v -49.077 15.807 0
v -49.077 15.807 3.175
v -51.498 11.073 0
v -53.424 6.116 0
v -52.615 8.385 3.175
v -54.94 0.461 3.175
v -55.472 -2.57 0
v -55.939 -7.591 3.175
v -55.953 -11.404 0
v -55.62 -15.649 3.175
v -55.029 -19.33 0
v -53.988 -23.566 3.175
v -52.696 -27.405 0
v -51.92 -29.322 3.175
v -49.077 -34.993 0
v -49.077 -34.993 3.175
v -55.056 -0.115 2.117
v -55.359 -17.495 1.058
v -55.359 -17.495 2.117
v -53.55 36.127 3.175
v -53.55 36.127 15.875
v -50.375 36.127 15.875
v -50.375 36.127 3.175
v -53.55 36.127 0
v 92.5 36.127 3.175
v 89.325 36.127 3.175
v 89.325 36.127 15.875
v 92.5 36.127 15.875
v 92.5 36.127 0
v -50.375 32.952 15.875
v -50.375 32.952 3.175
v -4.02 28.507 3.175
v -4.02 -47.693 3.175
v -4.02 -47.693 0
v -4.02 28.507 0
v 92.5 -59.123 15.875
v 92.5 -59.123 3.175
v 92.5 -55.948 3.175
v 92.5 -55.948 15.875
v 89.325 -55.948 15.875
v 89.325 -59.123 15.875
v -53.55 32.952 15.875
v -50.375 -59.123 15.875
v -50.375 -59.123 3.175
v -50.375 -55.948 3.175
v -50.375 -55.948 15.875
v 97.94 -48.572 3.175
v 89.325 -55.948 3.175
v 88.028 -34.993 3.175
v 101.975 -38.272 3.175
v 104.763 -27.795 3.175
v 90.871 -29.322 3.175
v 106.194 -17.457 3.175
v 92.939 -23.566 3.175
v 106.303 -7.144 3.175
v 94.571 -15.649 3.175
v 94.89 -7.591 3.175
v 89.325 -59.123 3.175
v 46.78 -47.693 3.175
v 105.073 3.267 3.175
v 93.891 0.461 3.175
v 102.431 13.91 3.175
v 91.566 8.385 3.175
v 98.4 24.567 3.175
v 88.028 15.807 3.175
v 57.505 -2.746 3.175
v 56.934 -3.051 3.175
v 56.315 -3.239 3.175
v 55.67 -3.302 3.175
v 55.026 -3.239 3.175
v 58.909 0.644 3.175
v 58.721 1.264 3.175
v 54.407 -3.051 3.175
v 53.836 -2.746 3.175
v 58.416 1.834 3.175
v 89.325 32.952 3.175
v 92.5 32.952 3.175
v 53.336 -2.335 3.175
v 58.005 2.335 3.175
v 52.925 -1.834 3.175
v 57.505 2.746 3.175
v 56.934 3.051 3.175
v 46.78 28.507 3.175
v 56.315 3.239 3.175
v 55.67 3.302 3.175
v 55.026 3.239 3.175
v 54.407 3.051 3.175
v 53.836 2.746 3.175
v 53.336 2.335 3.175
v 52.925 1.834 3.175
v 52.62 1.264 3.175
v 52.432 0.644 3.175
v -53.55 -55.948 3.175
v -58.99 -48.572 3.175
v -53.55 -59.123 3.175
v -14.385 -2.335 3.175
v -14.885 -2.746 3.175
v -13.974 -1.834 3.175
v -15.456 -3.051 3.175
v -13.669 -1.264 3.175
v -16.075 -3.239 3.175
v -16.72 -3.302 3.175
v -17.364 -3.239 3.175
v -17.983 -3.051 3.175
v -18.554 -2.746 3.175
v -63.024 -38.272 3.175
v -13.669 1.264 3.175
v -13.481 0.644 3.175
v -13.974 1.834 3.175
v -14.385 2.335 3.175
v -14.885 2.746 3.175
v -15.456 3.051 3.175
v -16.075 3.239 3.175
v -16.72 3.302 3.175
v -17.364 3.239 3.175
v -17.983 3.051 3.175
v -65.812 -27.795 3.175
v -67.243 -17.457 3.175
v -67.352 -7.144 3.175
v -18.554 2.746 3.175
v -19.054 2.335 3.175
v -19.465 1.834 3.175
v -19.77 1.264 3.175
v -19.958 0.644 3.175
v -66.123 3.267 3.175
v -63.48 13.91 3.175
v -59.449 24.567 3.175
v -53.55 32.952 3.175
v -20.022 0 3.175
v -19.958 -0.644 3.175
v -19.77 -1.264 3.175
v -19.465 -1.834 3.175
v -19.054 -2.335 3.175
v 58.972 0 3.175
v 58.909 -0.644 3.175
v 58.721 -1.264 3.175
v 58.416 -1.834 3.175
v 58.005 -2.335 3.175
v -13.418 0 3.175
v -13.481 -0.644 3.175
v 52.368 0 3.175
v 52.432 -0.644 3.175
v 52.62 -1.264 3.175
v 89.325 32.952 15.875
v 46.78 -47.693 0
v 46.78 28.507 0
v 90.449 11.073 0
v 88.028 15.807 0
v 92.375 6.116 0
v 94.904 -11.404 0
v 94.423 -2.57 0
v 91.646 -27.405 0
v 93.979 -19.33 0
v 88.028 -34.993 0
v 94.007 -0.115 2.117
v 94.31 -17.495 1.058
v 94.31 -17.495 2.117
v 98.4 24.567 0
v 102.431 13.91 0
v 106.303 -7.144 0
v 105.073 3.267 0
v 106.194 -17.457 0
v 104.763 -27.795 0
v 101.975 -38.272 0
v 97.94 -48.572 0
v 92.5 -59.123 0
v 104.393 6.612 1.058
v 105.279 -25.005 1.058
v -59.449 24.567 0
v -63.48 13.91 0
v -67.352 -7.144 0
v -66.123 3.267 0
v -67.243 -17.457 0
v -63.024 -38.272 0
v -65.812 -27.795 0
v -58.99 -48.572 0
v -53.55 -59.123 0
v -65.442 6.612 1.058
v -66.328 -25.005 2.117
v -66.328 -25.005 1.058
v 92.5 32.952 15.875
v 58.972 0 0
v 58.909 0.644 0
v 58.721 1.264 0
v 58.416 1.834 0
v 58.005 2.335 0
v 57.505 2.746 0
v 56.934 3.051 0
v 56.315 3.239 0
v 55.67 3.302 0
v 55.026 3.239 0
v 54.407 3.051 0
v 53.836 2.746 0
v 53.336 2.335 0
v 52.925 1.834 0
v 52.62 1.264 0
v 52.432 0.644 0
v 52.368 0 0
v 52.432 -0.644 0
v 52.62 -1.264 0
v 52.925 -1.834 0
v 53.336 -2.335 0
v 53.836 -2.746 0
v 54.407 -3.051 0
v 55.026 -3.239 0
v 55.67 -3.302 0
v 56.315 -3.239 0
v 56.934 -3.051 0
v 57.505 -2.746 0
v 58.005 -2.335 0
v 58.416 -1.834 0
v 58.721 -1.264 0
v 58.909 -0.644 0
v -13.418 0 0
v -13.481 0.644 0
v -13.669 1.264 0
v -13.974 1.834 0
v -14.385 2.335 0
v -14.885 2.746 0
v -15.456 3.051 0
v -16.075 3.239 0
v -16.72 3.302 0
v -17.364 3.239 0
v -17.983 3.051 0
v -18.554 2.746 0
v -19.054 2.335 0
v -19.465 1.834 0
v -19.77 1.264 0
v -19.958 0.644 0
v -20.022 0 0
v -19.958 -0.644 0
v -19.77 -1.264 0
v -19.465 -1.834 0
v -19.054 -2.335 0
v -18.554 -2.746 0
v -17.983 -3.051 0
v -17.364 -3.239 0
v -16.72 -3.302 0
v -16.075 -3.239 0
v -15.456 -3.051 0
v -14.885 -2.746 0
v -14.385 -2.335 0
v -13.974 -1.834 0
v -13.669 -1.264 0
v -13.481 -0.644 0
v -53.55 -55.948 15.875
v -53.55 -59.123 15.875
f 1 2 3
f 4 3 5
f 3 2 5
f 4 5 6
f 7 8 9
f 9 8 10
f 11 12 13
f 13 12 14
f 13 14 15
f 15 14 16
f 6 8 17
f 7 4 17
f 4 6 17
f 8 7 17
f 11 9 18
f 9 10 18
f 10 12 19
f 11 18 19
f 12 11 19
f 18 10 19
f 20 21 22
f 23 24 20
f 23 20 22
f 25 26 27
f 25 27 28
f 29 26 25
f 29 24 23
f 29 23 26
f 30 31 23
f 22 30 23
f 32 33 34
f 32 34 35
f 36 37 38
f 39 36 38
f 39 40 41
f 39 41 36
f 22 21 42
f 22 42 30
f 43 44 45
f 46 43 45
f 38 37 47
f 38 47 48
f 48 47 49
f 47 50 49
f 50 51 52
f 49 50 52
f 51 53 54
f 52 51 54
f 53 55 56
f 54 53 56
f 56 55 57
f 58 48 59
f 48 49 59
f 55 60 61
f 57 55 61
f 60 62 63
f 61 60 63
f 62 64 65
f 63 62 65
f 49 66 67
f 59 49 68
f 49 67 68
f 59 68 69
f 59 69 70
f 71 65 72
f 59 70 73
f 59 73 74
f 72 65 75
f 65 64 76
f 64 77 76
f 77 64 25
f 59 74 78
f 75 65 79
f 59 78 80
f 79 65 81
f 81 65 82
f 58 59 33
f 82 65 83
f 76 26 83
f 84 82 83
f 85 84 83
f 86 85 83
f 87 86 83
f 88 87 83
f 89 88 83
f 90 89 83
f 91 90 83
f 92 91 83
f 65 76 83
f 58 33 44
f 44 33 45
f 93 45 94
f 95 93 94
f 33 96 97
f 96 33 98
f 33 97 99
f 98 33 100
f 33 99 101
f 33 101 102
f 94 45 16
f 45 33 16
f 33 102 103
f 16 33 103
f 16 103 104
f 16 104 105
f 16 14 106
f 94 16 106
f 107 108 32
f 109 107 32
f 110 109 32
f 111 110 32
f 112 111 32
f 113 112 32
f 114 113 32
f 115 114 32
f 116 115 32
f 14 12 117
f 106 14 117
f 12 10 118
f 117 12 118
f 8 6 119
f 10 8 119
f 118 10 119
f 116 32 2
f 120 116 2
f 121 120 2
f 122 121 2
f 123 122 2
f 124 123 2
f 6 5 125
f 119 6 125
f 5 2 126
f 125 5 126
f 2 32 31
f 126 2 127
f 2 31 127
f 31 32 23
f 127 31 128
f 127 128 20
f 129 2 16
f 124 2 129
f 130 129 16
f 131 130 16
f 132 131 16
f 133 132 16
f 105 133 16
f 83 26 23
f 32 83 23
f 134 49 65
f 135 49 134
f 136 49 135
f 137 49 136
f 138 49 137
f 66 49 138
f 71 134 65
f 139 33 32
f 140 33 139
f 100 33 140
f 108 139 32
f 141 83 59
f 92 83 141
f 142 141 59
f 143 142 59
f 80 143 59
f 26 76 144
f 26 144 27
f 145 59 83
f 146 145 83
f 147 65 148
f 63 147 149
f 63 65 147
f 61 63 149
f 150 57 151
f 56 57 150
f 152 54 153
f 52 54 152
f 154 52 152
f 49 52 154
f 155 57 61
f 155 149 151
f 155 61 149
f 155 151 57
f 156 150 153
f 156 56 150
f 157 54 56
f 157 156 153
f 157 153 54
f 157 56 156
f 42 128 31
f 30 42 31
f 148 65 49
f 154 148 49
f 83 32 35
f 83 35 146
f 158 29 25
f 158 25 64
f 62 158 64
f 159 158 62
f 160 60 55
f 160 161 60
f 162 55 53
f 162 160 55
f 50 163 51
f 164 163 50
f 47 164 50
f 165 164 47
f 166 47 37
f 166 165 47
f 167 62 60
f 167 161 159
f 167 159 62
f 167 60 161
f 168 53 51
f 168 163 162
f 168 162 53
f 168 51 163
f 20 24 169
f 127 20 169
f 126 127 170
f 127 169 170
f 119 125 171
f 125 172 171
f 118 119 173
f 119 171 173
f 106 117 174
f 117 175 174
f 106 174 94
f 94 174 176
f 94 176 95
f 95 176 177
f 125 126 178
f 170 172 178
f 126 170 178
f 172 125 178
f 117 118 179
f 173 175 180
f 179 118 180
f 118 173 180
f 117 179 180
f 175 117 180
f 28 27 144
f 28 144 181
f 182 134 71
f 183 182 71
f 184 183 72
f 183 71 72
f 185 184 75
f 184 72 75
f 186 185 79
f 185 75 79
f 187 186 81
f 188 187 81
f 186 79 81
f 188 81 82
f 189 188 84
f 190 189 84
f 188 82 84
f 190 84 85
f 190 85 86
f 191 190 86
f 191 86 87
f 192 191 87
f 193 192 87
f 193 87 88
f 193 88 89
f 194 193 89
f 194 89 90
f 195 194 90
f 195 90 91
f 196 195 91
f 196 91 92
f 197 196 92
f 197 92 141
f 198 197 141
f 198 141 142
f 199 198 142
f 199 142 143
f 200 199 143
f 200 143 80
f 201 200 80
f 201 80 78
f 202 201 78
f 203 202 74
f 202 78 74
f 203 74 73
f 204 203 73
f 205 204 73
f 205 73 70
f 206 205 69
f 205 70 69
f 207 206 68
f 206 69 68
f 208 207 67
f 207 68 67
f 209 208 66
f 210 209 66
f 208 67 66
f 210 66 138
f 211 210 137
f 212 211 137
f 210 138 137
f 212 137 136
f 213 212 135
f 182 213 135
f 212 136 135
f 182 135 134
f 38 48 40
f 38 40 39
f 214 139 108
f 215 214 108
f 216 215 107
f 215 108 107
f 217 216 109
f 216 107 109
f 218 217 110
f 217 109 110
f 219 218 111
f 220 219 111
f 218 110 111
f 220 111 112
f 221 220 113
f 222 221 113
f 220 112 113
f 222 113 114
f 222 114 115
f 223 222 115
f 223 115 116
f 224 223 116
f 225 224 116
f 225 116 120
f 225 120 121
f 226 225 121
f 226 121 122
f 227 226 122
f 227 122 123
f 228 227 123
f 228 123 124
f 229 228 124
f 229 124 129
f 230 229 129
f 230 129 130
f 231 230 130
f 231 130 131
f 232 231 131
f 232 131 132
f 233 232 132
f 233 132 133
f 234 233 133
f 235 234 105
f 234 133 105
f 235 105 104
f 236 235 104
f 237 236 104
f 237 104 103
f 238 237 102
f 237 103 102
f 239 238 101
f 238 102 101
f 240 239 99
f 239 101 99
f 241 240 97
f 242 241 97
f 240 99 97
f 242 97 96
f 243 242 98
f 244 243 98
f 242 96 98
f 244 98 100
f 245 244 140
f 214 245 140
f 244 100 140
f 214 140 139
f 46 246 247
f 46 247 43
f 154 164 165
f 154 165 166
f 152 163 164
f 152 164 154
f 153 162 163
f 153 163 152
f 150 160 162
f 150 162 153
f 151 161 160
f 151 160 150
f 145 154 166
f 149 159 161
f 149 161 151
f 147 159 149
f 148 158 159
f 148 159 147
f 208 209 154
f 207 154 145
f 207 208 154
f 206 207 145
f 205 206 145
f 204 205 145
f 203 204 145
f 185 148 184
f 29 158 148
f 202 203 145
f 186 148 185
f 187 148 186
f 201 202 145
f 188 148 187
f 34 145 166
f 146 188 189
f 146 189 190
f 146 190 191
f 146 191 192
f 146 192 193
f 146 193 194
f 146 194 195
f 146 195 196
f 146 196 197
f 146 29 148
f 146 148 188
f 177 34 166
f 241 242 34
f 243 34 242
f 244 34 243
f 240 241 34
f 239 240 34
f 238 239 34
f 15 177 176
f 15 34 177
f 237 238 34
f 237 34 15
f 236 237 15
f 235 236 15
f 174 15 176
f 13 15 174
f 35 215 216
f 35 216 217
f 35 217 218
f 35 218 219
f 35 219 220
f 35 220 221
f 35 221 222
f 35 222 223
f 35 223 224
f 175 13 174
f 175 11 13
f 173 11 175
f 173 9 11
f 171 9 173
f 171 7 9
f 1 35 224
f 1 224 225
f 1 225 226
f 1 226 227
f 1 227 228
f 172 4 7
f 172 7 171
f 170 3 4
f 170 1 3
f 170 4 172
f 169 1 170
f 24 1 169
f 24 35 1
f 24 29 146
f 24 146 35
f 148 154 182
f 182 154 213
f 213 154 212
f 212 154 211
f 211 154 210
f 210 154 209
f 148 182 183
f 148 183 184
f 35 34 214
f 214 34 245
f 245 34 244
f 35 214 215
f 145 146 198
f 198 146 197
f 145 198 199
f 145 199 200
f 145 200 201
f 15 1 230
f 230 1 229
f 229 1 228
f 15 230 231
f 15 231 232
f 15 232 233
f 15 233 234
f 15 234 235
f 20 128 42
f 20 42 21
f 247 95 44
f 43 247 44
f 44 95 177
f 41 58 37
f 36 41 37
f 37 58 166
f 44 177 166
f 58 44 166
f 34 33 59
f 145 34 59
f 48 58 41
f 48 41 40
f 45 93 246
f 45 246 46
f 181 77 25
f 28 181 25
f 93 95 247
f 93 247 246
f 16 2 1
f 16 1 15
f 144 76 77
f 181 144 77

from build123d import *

# Parameters (mm, degrees)
SKETCH1_W           = 73.025
SKETCH1_H           = 95.25
BOSS_EXTRUDE1_DEPTH = 3.175
SKETCH2_R           = 3.302
SKETCH2_W           = 50.8
SKETCH2_H           = 76.2
CUT_EXTRUDE1_DEPTH  = 3.81
SKETCH3_W           = 3.175
SKETCH3_H           = 3.175
BOSS_EXTRUDE2_DEPTH = 12.7


with BuildPart() as part:
    # Sketch1 → Boss-Extrude1 (new body)
    with BuildSketch(Plane.XY):
        with BuildLine():
            Line((-53.549611798, 36.126771133), (-53.549611798, -59.123228867))
            add(Edge.make_bspline(
                [(-53.549611798, 36.126771133), (-70.059671862, 7.530508267), (-74.046742033, -23.621157889), (-53.549611798, -59.123228867)],
                knots=[0, 0, 0, 0, 1, 1, 1, 1], degree=3))
        make_face()
        with Locations((-17.037111798, -11.498228867)):
            Rectangle(SKETCH1_W, SKETCH1_H)
        with Locations((55.987888202, -11.498228867)):
            Rectangle(SKETCH1_W, SKETCH1_H)
        with BuildLine():
            add(Edge.make_bspline(
                [(92.500388202, 36.126771133), (109.010448266, 7.530508267), (112.997518438, -23.621157889), (92.500388202, -59.123228867)],
                knots=[0, 0, 0, 0, 1, 1, 1, 1], degree=3))
            Line((92.500388202, -59.123228867), (92.500388202, 36.126771133))
        make_face()
    extrude(amount=BOSS_EXTRUDE1_DEPTH)

    # Sketch2 → Cut-Extrude1 (cut)
    with BuildSketch(Plane.XY.offset(3.175)):
        with Locations((-16.719611798, 0)):
            Circle(SKETCH2_R)
        with Locations((55.670388202, 0)):
            Circle(SKETCH2_R)
        with Locations((21.380388202, -9.593228867)):
            Rectangle(SKETCH2_W, SKETCH2_H)
        with BuildLine():
            Line((-49.077041311, 15.806771133), (-49.077041311, -34.993228867))
            add(Edge.make_bspline(
                [(-49.077041311, 15.806771133), (-57.589988192, 1.061914612), (-58.955244286, -17.883679426), (-49.077041311, -34.993228867)],
                knots=[0, 0, 0, 0, 1, 1, 1, 1], degree=3))
        make_face()
        with BuildLine():
            Line((88.027817715, 15.806771133), (88.027817715, -34.993228867))
            add(Edge.make_bspline(
                [(88.027817715, 15.806771133), (96.540764597, 1.061914612), (97.90602069, -17.883679426), (88.027817715, -34.993228867)],
                knots=[0, 0, 0, 0, 1, 1, 1, 1], degree=3))
        make_face()
    extrude(amount=-CUT_EXTRUDE1_DEPTH, mode=Mode.SUBTRACT)

    # Sketch3 → Boss-Extrude2 (add)
    with BuildSketch(Plane.XY.offset(3.175)):
        with Locations((-51.962111798, 34.539271133)):
            Rectangle(SKETCH3_W, SKETCH3_H)
        with Locations((-51.962111798, -57.535728867)):
            Rectangle(SKETCH3_W, SKETCH3_H)
        with Locations((90.912888202, -57.535728867)):
            Rectangle(SKETCH3_W, SKETCH3_H)
        with Locations((90.912888202, 34.539271133)):
            Rectangle(SKETCH3_W, SKETCH3_H)
    extrude(amount=BOSS_EXTRUDE2_DEPTH)


solid = part.part
